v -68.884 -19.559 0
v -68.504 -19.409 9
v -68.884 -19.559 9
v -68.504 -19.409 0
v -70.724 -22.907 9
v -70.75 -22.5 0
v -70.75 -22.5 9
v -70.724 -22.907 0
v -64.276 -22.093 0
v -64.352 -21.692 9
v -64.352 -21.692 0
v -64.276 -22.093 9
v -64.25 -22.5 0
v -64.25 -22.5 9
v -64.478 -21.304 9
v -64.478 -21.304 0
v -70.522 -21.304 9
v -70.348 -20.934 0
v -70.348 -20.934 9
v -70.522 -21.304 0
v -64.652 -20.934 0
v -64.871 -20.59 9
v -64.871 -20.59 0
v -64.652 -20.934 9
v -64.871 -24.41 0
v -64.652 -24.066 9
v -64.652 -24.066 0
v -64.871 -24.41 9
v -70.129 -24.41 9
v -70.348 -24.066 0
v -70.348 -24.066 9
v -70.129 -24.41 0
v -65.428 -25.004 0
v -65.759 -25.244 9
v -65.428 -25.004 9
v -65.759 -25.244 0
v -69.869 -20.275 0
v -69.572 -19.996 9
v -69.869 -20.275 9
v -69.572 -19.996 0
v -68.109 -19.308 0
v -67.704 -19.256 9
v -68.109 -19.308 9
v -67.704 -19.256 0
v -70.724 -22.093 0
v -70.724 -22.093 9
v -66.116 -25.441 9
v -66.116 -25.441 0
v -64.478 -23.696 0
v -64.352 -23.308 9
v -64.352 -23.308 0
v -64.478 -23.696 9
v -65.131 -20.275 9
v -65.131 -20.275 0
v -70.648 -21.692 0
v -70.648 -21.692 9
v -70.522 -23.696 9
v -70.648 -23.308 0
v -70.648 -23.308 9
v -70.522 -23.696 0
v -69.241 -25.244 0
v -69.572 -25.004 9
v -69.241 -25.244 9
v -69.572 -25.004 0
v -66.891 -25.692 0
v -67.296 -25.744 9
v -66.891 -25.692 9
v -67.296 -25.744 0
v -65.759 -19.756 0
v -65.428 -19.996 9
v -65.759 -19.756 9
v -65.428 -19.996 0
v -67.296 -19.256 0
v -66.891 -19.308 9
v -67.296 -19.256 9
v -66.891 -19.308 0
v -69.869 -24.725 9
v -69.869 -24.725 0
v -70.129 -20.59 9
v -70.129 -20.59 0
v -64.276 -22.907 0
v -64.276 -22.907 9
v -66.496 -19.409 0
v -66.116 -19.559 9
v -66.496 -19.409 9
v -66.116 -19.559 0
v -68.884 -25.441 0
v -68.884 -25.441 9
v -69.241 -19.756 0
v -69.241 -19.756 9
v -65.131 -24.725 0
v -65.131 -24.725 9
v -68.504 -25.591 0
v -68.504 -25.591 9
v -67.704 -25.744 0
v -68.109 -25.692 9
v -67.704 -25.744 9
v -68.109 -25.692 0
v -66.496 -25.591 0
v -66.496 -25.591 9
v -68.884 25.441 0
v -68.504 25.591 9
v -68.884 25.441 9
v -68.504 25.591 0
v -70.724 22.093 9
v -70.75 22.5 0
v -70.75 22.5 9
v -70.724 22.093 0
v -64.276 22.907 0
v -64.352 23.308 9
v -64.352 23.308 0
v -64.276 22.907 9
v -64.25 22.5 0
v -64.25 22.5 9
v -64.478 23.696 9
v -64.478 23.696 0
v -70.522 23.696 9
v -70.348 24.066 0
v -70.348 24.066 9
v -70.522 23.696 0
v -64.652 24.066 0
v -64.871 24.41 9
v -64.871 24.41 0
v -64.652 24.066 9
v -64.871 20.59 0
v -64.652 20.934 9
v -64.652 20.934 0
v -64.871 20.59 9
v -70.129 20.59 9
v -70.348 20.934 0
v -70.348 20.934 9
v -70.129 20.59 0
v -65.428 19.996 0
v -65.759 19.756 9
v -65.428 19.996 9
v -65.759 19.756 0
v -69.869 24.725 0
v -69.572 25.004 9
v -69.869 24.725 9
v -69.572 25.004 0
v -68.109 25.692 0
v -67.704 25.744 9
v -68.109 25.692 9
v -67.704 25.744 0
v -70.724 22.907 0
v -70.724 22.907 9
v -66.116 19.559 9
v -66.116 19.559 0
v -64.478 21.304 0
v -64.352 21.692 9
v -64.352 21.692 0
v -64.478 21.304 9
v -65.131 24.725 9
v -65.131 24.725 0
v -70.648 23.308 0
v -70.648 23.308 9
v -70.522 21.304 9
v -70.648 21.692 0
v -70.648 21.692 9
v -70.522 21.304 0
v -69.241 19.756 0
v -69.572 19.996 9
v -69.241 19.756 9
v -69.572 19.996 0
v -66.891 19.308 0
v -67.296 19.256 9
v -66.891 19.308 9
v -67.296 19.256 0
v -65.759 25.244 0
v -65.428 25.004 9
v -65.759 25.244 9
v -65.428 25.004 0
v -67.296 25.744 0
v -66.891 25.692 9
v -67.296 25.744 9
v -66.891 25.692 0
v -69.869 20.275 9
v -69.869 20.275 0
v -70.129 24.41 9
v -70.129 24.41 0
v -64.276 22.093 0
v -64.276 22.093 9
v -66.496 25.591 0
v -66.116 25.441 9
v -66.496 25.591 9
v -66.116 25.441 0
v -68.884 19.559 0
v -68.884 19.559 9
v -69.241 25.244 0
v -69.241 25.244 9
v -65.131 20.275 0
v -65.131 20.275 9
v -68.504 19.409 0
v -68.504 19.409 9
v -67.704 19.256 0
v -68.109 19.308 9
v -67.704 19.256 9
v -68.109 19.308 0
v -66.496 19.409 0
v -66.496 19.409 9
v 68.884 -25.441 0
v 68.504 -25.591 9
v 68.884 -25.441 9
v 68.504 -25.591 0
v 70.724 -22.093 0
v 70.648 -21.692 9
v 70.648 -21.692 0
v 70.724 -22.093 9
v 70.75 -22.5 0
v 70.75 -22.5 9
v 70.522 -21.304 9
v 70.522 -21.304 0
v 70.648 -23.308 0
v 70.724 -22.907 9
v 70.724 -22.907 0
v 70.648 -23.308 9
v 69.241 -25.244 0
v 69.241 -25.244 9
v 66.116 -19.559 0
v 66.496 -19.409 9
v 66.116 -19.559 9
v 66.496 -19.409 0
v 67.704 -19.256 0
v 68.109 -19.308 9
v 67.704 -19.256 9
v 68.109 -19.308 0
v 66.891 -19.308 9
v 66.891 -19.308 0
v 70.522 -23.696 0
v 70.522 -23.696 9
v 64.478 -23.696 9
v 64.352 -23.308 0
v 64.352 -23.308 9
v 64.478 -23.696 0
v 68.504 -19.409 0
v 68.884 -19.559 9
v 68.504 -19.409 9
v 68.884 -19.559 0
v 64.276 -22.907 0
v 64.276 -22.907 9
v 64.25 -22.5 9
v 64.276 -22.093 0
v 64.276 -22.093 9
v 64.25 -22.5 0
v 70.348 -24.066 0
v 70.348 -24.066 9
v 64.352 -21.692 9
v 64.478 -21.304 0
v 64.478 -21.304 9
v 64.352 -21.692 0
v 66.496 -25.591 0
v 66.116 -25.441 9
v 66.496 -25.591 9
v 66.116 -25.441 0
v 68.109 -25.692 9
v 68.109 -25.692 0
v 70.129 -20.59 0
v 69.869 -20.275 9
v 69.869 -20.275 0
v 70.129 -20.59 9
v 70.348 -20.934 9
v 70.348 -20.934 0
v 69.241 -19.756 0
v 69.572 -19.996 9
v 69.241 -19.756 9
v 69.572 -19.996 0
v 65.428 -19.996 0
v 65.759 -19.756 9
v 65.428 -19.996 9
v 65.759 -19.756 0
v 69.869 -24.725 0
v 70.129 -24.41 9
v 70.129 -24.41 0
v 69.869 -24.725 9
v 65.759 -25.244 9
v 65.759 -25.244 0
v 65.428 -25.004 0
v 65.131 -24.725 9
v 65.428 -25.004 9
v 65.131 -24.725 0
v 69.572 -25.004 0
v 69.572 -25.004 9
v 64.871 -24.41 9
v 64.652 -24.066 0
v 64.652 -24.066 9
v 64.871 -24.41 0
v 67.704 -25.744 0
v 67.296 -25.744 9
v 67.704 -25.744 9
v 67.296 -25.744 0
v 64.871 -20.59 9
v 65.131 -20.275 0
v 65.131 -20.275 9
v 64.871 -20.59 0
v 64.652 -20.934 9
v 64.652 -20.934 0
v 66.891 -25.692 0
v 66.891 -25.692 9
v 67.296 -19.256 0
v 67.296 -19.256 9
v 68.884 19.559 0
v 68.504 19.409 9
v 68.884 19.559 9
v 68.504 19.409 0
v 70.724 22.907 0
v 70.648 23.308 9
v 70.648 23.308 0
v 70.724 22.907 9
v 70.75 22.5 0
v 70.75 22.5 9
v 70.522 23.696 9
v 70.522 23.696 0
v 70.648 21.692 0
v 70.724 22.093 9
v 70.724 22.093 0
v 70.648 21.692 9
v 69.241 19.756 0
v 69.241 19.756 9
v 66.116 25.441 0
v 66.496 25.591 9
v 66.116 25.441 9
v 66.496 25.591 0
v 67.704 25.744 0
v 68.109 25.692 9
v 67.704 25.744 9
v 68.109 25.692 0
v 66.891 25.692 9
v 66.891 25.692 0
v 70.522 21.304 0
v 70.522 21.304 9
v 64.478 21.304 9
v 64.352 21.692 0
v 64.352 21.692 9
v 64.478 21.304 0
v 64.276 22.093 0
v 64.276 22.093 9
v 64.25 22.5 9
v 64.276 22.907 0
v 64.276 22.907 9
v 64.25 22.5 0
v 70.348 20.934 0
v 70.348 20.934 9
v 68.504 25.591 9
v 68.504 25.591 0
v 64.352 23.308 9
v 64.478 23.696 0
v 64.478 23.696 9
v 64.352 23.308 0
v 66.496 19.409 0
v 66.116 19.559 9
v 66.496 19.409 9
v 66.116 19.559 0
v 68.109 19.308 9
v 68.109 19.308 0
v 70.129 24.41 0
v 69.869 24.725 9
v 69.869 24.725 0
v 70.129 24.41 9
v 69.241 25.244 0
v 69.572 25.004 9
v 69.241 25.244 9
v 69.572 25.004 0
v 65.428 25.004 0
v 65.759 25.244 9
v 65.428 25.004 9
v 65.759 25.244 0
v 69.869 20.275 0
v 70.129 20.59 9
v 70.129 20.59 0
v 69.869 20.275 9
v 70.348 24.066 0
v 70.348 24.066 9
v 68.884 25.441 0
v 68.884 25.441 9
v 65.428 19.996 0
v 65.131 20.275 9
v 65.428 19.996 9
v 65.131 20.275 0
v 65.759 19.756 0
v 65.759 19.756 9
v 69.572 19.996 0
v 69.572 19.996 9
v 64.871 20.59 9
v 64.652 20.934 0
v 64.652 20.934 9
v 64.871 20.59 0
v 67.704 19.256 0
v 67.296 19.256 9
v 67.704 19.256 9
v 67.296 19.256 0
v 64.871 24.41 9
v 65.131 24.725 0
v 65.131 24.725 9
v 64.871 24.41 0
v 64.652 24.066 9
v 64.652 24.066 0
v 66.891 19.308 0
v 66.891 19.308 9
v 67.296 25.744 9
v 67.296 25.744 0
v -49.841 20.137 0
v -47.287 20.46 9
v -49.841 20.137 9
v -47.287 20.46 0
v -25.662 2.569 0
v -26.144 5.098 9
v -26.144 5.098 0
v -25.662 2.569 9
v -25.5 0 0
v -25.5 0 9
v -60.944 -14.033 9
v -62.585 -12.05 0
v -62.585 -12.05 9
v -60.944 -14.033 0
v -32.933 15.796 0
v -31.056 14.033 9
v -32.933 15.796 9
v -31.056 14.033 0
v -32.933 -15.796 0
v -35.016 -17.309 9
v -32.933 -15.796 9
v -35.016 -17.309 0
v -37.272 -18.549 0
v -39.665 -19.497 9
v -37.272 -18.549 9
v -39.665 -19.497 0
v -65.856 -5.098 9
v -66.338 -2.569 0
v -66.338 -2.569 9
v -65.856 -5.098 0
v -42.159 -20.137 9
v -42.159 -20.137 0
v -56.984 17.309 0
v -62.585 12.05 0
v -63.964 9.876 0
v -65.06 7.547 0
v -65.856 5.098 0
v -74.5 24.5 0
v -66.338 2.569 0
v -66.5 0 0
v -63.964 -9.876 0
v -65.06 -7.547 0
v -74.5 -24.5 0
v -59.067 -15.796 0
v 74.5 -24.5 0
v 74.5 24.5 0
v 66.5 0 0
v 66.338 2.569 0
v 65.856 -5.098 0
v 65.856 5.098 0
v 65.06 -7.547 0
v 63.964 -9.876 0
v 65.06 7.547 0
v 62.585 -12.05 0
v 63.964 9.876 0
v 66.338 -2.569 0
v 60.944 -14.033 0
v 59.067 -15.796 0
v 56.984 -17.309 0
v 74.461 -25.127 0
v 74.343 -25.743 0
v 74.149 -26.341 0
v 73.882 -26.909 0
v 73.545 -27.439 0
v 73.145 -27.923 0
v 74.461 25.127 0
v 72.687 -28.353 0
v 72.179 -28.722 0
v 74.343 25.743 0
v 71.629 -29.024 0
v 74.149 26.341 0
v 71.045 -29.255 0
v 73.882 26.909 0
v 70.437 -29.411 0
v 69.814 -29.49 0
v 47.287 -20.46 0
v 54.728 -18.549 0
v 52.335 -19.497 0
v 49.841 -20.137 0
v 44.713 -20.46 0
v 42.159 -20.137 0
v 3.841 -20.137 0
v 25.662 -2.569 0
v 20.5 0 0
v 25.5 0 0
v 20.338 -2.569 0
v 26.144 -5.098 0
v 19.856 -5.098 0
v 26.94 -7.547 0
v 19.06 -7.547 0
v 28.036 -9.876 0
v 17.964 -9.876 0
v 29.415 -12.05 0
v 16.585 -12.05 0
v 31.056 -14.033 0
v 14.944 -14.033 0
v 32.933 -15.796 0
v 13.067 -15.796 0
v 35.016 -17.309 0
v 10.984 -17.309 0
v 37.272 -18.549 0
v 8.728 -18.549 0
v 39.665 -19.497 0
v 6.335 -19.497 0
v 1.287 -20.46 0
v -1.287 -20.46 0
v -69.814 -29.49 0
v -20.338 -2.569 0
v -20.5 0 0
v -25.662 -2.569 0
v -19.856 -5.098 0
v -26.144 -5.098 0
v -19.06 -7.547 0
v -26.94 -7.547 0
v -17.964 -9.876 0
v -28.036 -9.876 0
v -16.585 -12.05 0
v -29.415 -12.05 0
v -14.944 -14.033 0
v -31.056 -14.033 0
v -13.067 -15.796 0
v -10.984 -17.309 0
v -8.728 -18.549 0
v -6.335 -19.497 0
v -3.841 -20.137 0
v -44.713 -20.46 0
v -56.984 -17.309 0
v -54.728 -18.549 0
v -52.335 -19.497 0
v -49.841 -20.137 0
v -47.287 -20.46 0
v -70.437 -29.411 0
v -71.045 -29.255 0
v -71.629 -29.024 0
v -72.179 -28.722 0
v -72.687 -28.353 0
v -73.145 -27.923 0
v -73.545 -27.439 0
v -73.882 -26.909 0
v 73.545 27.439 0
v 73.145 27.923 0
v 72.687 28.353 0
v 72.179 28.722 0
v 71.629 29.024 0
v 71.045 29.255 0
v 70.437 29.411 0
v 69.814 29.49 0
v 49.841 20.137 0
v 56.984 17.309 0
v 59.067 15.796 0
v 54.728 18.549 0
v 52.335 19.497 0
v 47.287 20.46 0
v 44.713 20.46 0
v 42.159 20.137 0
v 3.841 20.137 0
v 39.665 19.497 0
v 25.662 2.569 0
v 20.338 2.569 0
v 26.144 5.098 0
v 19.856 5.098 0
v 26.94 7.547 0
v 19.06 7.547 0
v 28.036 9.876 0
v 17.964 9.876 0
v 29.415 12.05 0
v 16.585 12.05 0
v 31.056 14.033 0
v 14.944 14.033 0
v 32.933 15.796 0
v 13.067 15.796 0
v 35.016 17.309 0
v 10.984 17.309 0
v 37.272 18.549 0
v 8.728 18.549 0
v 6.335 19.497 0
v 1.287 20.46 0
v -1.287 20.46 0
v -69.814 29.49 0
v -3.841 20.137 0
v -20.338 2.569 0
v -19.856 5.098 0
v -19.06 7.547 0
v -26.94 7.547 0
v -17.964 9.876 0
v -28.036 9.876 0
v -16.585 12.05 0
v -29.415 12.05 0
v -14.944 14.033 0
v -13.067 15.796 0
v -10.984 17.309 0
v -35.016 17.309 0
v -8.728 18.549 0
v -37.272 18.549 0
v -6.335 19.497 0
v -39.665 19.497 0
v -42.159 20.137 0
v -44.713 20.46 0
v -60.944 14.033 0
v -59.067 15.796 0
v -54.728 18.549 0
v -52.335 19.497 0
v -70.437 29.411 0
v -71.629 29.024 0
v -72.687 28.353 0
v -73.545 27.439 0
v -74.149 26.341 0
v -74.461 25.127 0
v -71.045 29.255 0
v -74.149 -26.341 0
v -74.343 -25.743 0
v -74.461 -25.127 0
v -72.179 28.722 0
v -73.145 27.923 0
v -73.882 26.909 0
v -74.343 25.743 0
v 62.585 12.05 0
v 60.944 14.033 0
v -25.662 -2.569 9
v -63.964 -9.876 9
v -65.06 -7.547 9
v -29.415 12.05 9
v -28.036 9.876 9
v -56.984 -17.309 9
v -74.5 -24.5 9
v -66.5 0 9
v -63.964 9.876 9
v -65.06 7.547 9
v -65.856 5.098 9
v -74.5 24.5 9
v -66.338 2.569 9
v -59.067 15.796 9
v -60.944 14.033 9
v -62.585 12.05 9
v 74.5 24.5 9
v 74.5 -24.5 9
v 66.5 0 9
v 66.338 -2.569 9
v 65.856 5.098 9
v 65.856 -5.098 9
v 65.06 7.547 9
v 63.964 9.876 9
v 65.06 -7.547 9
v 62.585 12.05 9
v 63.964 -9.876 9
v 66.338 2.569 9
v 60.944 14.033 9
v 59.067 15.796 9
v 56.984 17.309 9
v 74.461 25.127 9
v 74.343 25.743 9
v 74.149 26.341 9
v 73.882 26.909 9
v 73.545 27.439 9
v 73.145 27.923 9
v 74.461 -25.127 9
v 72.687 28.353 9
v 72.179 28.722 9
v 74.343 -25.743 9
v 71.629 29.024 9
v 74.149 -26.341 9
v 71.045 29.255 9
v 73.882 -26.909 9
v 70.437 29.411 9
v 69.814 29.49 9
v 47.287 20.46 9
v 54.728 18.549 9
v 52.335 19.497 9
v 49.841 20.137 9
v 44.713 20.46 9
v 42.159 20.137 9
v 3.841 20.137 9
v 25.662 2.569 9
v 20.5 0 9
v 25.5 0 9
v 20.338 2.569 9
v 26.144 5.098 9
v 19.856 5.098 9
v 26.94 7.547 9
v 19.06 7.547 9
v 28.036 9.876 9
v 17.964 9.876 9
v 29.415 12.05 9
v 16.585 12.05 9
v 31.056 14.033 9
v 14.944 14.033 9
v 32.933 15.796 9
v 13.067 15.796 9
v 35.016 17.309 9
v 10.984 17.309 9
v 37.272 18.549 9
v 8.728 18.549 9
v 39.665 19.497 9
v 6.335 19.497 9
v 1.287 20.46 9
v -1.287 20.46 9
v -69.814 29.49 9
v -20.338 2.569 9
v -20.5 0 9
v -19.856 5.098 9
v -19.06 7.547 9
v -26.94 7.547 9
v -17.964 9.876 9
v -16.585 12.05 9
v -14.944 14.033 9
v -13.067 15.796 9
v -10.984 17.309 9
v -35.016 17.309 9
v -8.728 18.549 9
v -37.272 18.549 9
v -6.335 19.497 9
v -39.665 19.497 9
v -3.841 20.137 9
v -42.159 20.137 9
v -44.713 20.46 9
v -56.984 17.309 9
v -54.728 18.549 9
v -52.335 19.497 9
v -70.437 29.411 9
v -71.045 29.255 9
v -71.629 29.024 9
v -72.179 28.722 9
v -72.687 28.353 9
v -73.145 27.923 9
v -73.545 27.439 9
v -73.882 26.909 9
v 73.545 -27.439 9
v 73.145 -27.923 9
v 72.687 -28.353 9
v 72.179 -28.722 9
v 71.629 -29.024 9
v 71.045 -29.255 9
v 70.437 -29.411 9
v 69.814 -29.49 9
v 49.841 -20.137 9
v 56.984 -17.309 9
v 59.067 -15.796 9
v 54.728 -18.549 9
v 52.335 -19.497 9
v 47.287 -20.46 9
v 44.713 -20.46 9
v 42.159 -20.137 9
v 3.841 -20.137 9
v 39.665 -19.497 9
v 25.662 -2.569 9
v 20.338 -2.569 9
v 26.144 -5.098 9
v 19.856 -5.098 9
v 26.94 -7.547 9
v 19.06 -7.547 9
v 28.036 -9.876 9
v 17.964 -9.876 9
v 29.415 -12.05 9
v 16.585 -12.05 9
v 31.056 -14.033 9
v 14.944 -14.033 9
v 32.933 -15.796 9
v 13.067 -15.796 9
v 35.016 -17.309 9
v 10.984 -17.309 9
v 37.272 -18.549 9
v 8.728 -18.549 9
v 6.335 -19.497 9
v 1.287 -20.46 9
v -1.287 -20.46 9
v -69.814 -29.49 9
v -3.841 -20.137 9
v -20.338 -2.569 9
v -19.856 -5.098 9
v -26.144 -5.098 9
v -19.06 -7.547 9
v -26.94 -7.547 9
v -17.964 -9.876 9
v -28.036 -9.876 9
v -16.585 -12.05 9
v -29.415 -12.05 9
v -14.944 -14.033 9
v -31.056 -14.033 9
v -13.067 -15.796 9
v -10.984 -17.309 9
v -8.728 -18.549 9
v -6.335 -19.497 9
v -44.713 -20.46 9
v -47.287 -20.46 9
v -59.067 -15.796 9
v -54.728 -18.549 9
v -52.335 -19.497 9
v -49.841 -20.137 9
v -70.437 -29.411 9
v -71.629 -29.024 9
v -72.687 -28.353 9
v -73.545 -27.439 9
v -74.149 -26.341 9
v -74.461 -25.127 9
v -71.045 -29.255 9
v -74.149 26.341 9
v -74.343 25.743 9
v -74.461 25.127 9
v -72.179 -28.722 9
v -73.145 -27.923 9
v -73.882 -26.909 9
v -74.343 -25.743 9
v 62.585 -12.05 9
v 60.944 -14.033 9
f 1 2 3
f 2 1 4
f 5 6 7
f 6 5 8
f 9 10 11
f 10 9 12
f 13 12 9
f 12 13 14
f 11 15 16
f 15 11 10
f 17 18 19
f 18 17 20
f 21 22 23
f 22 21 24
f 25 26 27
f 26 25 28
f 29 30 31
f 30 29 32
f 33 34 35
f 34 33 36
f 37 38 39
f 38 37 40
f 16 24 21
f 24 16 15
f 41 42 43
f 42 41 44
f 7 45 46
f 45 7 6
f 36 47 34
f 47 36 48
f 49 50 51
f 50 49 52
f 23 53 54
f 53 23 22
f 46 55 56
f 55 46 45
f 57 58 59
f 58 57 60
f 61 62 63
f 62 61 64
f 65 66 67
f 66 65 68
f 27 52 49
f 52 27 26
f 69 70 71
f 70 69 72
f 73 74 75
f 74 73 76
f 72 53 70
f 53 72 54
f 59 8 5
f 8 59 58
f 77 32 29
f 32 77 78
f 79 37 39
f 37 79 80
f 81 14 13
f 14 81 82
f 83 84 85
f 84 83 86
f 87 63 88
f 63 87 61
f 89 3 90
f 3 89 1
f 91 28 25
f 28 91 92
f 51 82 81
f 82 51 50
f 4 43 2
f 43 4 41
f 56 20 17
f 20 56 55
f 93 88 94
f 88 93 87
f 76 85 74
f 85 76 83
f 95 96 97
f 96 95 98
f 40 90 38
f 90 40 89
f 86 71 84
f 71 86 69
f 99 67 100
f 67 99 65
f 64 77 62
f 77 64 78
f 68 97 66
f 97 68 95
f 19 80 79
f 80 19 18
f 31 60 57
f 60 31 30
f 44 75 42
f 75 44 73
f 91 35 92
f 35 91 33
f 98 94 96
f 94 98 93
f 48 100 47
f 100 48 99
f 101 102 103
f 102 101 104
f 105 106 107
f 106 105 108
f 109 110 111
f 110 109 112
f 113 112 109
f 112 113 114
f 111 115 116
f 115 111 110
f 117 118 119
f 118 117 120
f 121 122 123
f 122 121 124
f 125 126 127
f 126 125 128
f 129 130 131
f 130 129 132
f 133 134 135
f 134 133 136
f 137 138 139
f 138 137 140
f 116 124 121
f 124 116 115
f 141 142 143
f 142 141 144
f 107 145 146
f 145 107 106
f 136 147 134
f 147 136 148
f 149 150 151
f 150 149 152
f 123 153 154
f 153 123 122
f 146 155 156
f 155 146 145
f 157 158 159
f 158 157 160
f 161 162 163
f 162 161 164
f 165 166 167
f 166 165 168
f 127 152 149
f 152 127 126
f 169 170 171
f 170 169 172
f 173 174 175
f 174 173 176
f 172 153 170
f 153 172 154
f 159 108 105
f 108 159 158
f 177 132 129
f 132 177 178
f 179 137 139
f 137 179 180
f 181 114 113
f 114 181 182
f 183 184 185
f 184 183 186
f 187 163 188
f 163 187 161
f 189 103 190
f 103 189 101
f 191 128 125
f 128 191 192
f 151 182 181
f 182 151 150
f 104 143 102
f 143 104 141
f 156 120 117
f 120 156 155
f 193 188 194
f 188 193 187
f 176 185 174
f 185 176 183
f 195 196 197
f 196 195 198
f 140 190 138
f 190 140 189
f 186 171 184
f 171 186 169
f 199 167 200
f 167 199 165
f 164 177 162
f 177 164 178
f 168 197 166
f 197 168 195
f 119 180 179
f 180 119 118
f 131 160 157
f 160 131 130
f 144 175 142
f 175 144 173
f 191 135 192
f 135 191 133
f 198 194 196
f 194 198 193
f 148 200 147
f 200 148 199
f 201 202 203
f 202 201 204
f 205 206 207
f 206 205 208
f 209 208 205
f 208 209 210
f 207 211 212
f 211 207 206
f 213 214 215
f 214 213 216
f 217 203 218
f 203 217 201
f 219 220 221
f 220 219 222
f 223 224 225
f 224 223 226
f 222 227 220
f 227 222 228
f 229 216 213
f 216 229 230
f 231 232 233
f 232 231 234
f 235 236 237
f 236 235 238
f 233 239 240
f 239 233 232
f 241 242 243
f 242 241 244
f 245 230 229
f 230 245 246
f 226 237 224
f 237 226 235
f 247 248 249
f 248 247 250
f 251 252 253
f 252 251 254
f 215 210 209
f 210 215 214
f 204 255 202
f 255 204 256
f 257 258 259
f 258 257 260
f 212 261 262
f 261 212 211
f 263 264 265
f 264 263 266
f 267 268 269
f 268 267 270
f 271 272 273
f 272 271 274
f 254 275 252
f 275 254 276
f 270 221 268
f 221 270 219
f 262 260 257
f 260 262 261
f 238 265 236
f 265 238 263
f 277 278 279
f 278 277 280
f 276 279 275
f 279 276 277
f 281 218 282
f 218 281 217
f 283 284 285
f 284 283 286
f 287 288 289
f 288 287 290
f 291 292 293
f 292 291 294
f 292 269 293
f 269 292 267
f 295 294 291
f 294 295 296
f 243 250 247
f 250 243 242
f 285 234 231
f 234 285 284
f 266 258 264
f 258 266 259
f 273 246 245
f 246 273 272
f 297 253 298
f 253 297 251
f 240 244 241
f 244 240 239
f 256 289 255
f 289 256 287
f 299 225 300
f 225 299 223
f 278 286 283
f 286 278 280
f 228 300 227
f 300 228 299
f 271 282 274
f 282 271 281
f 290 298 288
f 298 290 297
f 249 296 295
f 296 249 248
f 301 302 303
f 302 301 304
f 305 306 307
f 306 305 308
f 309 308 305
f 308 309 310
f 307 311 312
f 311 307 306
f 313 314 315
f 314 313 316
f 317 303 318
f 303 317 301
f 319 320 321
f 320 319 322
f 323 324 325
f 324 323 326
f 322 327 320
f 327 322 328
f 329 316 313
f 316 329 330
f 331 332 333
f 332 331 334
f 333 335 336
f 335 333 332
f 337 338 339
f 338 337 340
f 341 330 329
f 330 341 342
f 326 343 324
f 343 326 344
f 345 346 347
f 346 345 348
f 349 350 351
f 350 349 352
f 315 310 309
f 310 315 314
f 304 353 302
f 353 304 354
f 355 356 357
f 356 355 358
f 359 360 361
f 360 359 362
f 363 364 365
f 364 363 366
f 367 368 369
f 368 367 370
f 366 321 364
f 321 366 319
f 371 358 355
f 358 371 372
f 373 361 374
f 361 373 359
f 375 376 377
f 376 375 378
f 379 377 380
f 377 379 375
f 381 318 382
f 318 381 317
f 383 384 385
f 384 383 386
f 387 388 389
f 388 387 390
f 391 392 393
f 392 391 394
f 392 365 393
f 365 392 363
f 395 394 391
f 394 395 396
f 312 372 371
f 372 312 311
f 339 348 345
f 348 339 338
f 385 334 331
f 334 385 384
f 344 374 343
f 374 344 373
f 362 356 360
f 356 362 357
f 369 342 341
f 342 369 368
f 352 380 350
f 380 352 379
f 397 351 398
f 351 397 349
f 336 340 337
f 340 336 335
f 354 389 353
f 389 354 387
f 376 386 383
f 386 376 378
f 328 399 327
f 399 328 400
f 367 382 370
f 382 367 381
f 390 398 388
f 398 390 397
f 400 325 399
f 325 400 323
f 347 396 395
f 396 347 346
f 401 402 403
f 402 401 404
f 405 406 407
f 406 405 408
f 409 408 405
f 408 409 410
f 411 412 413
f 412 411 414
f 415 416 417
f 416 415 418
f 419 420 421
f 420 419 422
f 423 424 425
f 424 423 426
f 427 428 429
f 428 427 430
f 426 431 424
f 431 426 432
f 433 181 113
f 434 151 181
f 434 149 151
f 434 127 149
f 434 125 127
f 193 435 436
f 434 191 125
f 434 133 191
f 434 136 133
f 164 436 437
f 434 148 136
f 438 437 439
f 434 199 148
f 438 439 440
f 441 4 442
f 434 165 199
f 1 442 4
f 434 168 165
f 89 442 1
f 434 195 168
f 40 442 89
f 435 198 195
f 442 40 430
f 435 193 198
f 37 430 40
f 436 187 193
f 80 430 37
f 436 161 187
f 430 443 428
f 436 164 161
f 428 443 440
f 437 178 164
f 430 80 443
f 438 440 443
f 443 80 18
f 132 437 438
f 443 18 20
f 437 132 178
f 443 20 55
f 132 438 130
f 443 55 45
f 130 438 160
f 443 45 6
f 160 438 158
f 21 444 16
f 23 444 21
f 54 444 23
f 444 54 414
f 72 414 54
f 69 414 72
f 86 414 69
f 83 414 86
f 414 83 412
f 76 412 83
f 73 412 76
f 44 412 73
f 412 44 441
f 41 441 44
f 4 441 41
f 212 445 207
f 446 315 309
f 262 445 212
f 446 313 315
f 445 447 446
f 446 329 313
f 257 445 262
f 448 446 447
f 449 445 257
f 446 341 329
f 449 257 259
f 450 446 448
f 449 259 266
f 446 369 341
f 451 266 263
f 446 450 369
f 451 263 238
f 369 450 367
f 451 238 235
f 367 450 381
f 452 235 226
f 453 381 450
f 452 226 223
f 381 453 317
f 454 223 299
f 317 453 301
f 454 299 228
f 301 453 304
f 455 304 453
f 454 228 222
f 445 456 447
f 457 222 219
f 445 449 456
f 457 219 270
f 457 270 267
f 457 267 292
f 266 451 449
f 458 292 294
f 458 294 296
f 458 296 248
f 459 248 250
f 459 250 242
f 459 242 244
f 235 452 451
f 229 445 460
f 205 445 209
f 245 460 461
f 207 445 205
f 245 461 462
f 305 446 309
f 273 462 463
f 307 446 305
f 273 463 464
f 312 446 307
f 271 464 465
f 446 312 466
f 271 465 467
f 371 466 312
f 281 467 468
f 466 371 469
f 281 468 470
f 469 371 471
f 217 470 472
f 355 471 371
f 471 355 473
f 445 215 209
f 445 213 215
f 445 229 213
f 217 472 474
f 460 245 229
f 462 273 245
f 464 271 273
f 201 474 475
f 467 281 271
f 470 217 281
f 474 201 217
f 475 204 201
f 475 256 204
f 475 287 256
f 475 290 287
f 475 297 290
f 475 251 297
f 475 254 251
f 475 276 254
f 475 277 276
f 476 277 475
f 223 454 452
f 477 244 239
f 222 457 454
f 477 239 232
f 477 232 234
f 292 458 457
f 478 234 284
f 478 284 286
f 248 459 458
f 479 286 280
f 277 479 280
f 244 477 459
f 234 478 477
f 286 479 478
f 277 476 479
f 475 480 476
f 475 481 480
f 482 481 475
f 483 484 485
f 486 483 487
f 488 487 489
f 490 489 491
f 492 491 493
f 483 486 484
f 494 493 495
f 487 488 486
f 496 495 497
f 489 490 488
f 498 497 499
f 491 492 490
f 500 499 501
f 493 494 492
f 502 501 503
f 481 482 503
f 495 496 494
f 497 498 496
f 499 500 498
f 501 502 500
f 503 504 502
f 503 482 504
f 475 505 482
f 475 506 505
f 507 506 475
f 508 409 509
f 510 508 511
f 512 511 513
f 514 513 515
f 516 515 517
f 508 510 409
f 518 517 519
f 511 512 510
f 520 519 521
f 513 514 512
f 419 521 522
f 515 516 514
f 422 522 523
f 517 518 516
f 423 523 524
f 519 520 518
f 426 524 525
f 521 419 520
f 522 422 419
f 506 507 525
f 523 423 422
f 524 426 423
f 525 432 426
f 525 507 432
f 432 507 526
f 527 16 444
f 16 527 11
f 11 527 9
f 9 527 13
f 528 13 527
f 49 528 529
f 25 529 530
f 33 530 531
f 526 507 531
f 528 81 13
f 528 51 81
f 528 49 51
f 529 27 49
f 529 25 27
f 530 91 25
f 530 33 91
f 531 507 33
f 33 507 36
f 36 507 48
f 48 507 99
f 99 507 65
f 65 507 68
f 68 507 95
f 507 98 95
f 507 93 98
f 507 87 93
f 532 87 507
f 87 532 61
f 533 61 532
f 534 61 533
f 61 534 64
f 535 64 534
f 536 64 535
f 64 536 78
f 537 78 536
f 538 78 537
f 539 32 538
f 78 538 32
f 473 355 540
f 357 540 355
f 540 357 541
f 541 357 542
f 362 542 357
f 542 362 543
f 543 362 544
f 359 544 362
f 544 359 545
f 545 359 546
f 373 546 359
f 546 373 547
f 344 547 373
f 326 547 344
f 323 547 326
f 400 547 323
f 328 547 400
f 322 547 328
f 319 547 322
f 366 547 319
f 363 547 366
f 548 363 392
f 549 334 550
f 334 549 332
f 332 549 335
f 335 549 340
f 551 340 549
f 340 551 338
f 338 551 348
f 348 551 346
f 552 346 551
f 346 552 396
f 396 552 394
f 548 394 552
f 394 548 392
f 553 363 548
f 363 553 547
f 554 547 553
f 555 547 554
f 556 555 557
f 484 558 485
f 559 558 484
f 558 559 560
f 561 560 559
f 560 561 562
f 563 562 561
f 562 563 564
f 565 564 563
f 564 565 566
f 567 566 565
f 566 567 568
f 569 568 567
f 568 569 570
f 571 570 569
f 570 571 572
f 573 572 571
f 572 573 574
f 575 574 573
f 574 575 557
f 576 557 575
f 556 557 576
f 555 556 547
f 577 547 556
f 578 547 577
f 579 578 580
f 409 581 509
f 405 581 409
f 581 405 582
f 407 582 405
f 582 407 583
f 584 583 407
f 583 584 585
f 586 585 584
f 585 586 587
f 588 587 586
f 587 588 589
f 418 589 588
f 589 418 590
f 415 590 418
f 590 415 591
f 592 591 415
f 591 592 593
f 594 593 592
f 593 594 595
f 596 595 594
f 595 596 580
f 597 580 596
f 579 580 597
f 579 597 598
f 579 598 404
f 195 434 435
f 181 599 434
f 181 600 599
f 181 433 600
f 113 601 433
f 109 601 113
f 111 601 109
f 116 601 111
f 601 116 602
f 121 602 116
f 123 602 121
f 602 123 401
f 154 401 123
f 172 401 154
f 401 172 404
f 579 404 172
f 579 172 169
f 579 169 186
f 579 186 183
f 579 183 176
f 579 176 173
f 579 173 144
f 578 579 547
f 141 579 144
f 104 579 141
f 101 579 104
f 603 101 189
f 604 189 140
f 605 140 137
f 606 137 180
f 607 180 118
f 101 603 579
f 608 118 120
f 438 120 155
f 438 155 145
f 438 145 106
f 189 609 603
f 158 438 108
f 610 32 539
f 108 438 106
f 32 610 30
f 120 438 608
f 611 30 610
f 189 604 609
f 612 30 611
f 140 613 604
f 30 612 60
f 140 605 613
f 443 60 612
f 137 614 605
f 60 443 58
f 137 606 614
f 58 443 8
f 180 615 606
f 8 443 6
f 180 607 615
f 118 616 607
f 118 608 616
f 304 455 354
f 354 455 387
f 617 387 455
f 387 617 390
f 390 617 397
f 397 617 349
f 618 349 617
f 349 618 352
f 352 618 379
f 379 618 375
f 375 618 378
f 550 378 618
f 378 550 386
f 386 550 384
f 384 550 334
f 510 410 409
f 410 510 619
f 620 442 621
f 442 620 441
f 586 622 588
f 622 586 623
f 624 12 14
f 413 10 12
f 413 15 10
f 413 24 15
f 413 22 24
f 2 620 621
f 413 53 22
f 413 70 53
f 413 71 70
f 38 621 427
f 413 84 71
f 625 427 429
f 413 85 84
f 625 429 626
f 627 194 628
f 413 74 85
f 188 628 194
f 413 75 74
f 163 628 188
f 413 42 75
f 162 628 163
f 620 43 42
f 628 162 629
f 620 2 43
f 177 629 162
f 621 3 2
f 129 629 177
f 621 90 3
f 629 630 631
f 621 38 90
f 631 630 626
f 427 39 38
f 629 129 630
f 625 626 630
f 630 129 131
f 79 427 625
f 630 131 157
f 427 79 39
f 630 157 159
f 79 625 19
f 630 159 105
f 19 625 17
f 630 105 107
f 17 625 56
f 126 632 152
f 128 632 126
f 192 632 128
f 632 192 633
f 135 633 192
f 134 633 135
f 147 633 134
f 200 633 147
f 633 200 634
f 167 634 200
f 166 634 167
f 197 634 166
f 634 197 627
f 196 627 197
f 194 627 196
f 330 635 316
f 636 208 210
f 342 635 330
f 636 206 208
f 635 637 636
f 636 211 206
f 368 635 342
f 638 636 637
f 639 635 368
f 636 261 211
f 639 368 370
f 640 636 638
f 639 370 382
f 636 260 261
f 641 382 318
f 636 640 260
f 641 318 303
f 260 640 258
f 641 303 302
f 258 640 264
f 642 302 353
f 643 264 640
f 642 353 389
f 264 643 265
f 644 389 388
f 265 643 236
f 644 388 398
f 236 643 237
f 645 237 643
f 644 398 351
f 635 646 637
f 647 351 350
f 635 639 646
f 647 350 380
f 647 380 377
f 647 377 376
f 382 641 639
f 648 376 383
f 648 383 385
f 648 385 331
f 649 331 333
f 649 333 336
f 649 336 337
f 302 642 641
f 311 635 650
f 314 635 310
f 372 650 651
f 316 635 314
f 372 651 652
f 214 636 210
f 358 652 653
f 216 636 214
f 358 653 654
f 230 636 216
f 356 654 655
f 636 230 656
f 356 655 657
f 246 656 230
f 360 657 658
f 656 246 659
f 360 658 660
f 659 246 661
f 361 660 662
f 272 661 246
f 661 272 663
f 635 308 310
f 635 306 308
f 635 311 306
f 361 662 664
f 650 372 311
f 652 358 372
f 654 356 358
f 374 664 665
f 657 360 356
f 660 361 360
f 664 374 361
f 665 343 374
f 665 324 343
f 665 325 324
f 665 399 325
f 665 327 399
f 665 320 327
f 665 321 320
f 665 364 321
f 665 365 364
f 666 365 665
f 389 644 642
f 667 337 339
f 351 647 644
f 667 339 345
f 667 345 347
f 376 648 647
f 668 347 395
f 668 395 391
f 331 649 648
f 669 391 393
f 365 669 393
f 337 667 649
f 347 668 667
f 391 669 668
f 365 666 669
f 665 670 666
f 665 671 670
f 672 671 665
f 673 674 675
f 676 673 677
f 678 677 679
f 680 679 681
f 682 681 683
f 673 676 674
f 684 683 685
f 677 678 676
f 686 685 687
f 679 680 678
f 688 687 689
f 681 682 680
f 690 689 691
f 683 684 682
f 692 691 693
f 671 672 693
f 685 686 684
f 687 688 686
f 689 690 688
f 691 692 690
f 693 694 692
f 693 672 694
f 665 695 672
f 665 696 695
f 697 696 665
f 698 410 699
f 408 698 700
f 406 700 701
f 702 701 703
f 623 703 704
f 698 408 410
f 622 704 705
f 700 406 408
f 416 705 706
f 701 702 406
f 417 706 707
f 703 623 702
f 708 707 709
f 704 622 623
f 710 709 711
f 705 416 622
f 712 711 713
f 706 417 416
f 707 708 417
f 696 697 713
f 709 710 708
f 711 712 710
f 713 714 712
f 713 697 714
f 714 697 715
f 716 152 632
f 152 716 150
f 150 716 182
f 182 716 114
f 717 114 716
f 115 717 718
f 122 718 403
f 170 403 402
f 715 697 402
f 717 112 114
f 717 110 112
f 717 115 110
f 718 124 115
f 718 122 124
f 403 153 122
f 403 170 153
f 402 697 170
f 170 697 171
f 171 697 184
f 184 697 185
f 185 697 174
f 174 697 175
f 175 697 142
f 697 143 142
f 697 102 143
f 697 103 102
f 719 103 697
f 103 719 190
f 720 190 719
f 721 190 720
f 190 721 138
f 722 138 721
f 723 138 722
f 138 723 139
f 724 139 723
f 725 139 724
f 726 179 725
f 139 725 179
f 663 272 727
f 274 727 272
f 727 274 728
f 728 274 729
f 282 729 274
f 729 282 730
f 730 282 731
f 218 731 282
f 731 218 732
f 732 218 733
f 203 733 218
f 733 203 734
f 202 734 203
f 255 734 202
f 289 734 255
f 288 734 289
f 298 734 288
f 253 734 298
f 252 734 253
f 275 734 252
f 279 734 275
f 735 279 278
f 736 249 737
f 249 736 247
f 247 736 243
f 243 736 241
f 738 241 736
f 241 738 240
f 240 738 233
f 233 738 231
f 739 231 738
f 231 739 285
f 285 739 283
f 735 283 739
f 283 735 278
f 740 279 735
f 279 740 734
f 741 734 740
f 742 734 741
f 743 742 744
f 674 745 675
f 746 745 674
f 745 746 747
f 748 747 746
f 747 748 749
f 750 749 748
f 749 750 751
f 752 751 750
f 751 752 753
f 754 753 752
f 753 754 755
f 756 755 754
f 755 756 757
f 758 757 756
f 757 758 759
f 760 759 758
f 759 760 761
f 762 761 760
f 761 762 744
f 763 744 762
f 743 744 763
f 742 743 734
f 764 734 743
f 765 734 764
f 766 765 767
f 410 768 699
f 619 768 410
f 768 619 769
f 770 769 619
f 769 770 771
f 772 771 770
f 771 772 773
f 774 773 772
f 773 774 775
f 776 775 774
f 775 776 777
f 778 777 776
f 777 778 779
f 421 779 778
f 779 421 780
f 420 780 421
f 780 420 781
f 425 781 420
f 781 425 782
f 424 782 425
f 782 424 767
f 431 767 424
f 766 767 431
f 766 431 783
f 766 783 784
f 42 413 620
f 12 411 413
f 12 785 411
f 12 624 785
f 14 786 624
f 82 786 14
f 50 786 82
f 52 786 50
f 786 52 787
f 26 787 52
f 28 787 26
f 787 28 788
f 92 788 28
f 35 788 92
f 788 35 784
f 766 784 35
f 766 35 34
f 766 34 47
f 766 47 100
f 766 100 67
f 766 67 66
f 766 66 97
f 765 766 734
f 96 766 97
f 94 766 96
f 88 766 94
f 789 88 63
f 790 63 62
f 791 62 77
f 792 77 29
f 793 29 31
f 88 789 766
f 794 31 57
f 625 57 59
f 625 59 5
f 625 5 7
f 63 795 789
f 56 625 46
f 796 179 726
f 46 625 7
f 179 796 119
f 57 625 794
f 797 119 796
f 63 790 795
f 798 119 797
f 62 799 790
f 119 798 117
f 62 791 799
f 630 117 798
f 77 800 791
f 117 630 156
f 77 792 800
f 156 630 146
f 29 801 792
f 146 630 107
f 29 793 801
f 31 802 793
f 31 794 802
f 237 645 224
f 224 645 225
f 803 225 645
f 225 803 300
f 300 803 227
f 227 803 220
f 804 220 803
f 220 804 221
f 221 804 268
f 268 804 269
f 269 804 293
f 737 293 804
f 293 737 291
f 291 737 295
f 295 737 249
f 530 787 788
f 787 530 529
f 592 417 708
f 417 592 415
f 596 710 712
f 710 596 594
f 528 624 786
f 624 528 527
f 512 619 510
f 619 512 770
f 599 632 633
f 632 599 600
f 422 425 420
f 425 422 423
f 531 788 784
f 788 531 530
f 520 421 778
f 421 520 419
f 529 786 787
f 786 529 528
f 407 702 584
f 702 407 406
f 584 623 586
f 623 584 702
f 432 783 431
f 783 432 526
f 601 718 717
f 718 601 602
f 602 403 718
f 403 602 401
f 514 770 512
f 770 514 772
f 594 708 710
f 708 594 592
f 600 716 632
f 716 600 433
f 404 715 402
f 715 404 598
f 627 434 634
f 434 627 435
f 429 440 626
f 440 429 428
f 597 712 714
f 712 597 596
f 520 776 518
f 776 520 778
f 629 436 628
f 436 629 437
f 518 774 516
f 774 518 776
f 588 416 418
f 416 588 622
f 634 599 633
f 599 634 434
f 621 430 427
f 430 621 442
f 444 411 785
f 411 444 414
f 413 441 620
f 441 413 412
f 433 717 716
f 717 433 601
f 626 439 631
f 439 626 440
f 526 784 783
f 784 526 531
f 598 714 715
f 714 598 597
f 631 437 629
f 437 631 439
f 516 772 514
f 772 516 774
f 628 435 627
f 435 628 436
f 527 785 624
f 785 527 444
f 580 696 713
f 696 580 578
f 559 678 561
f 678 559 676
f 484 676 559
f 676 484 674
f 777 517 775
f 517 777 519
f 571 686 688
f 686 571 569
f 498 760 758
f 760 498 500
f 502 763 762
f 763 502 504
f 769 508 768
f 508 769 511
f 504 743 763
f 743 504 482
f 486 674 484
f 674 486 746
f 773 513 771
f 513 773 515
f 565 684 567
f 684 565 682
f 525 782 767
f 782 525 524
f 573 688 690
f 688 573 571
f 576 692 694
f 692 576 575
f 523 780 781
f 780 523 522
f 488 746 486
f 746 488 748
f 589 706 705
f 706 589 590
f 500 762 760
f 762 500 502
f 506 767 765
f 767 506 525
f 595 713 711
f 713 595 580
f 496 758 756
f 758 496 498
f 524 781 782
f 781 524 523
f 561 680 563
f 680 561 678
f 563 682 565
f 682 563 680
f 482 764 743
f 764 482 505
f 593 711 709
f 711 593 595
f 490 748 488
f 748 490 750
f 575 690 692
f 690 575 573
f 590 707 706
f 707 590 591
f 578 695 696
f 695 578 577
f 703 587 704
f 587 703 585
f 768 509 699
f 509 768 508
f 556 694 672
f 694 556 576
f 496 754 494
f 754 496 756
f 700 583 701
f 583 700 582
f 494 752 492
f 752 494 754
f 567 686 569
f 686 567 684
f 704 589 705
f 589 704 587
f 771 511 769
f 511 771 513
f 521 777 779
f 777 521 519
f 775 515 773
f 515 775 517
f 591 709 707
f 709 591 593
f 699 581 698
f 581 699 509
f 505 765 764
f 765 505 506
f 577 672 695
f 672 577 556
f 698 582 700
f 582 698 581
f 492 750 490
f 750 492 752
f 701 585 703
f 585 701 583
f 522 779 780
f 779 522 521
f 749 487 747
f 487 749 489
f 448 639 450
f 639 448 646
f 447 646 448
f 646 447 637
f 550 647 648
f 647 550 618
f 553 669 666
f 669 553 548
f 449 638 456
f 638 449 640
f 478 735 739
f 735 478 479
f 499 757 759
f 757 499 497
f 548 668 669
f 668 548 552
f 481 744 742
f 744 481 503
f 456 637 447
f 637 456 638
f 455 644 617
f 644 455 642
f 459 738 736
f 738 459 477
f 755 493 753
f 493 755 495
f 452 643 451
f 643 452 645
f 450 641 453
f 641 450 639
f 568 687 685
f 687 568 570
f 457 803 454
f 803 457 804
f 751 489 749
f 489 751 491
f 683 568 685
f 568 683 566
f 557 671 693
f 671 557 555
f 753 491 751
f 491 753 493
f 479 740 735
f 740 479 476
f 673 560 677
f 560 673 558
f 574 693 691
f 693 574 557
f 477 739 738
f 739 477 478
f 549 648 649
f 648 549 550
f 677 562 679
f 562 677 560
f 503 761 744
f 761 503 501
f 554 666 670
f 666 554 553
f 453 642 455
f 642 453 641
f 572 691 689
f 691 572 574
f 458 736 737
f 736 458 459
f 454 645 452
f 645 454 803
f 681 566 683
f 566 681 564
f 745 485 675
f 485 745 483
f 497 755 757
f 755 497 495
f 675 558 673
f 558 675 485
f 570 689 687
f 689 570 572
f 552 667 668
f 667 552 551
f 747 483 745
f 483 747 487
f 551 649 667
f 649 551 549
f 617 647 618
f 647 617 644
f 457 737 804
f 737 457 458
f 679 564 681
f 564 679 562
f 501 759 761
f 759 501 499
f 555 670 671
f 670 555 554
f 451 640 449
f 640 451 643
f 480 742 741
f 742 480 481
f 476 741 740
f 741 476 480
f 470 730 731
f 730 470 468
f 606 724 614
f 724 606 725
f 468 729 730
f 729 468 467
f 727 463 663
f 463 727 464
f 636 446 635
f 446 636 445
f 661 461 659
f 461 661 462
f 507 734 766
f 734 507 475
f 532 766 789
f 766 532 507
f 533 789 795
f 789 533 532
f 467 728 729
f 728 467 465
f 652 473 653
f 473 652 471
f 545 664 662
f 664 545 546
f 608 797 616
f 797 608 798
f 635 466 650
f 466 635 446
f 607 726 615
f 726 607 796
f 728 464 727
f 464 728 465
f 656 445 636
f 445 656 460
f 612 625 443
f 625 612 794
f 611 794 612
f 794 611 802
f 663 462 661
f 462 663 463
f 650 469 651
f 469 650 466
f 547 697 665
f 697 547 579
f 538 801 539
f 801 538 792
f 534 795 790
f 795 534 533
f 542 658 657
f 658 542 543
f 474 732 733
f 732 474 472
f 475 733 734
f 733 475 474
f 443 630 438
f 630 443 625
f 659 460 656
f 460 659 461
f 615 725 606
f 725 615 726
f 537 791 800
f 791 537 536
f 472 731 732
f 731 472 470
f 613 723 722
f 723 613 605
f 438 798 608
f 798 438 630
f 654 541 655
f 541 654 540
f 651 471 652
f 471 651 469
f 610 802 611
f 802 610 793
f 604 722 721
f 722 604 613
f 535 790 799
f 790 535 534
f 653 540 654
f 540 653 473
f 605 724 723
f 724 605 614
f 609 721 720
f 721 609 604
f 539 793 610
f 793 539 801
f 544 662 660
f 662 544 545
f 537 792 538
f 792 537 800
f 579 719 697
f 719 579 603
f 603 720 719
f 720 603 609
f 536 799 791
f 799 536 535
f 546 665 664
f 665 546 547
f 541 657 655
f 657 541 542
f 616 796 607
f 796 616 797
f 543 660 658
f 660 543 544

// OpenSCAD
$fn = 50;


difference() {
	union() {
		hull() {
			translate(v = [-69.5000000000, 24.5000000000, 0]) {
				cylinder(h = 9, r = 5);
			}
			translate(v = [69.5000000000, 24.5000000000, 0]) {
				cylinder(h = 9, r = 5);
			}
			translate(v = [-69.5000000000, -24.5000000000, 0]) {
				cylinder(h = 9, r = 5);
			}
			translate(v = [69.5000000000, -24.5000000000, 0]) {
				cylinder(h = 9, r = 5);
			}
		}
	}
	union() {
		#translate(v = [-67.5000000000, -22.5000000000, -100.0000000000]) {
			cylinder(h = 200, r = 3.2500000000);
		}
		#translate(v = [-67.5000000000, 22.5000000000, -100.0000000000]) {
			cylinder(h = 200, r = 3.2500000000);
		}
		#translate(v = [67.5000000000, -22.5000000000, -100.0000000000]) {
			cylinder(h = 200, r = 3.2500000000);
		}
		#translate(v = [67.5000000000, 22.5000000000, -100.0000000000]) {
			cylinder(h = 200, r = 3.2500000000);
		}
		#translate(v = [-46.0000000000, 0, 0]) {
			cylinder(h = 9, r = 20.5000000000);
		}
		#cylinder(h = 9, r = 20.5000000000);
		#translate(v = [46.0000000000, 0, 0]) {
			cylinder(h = 9, r = 20.5000000000);
		}
	}
}
